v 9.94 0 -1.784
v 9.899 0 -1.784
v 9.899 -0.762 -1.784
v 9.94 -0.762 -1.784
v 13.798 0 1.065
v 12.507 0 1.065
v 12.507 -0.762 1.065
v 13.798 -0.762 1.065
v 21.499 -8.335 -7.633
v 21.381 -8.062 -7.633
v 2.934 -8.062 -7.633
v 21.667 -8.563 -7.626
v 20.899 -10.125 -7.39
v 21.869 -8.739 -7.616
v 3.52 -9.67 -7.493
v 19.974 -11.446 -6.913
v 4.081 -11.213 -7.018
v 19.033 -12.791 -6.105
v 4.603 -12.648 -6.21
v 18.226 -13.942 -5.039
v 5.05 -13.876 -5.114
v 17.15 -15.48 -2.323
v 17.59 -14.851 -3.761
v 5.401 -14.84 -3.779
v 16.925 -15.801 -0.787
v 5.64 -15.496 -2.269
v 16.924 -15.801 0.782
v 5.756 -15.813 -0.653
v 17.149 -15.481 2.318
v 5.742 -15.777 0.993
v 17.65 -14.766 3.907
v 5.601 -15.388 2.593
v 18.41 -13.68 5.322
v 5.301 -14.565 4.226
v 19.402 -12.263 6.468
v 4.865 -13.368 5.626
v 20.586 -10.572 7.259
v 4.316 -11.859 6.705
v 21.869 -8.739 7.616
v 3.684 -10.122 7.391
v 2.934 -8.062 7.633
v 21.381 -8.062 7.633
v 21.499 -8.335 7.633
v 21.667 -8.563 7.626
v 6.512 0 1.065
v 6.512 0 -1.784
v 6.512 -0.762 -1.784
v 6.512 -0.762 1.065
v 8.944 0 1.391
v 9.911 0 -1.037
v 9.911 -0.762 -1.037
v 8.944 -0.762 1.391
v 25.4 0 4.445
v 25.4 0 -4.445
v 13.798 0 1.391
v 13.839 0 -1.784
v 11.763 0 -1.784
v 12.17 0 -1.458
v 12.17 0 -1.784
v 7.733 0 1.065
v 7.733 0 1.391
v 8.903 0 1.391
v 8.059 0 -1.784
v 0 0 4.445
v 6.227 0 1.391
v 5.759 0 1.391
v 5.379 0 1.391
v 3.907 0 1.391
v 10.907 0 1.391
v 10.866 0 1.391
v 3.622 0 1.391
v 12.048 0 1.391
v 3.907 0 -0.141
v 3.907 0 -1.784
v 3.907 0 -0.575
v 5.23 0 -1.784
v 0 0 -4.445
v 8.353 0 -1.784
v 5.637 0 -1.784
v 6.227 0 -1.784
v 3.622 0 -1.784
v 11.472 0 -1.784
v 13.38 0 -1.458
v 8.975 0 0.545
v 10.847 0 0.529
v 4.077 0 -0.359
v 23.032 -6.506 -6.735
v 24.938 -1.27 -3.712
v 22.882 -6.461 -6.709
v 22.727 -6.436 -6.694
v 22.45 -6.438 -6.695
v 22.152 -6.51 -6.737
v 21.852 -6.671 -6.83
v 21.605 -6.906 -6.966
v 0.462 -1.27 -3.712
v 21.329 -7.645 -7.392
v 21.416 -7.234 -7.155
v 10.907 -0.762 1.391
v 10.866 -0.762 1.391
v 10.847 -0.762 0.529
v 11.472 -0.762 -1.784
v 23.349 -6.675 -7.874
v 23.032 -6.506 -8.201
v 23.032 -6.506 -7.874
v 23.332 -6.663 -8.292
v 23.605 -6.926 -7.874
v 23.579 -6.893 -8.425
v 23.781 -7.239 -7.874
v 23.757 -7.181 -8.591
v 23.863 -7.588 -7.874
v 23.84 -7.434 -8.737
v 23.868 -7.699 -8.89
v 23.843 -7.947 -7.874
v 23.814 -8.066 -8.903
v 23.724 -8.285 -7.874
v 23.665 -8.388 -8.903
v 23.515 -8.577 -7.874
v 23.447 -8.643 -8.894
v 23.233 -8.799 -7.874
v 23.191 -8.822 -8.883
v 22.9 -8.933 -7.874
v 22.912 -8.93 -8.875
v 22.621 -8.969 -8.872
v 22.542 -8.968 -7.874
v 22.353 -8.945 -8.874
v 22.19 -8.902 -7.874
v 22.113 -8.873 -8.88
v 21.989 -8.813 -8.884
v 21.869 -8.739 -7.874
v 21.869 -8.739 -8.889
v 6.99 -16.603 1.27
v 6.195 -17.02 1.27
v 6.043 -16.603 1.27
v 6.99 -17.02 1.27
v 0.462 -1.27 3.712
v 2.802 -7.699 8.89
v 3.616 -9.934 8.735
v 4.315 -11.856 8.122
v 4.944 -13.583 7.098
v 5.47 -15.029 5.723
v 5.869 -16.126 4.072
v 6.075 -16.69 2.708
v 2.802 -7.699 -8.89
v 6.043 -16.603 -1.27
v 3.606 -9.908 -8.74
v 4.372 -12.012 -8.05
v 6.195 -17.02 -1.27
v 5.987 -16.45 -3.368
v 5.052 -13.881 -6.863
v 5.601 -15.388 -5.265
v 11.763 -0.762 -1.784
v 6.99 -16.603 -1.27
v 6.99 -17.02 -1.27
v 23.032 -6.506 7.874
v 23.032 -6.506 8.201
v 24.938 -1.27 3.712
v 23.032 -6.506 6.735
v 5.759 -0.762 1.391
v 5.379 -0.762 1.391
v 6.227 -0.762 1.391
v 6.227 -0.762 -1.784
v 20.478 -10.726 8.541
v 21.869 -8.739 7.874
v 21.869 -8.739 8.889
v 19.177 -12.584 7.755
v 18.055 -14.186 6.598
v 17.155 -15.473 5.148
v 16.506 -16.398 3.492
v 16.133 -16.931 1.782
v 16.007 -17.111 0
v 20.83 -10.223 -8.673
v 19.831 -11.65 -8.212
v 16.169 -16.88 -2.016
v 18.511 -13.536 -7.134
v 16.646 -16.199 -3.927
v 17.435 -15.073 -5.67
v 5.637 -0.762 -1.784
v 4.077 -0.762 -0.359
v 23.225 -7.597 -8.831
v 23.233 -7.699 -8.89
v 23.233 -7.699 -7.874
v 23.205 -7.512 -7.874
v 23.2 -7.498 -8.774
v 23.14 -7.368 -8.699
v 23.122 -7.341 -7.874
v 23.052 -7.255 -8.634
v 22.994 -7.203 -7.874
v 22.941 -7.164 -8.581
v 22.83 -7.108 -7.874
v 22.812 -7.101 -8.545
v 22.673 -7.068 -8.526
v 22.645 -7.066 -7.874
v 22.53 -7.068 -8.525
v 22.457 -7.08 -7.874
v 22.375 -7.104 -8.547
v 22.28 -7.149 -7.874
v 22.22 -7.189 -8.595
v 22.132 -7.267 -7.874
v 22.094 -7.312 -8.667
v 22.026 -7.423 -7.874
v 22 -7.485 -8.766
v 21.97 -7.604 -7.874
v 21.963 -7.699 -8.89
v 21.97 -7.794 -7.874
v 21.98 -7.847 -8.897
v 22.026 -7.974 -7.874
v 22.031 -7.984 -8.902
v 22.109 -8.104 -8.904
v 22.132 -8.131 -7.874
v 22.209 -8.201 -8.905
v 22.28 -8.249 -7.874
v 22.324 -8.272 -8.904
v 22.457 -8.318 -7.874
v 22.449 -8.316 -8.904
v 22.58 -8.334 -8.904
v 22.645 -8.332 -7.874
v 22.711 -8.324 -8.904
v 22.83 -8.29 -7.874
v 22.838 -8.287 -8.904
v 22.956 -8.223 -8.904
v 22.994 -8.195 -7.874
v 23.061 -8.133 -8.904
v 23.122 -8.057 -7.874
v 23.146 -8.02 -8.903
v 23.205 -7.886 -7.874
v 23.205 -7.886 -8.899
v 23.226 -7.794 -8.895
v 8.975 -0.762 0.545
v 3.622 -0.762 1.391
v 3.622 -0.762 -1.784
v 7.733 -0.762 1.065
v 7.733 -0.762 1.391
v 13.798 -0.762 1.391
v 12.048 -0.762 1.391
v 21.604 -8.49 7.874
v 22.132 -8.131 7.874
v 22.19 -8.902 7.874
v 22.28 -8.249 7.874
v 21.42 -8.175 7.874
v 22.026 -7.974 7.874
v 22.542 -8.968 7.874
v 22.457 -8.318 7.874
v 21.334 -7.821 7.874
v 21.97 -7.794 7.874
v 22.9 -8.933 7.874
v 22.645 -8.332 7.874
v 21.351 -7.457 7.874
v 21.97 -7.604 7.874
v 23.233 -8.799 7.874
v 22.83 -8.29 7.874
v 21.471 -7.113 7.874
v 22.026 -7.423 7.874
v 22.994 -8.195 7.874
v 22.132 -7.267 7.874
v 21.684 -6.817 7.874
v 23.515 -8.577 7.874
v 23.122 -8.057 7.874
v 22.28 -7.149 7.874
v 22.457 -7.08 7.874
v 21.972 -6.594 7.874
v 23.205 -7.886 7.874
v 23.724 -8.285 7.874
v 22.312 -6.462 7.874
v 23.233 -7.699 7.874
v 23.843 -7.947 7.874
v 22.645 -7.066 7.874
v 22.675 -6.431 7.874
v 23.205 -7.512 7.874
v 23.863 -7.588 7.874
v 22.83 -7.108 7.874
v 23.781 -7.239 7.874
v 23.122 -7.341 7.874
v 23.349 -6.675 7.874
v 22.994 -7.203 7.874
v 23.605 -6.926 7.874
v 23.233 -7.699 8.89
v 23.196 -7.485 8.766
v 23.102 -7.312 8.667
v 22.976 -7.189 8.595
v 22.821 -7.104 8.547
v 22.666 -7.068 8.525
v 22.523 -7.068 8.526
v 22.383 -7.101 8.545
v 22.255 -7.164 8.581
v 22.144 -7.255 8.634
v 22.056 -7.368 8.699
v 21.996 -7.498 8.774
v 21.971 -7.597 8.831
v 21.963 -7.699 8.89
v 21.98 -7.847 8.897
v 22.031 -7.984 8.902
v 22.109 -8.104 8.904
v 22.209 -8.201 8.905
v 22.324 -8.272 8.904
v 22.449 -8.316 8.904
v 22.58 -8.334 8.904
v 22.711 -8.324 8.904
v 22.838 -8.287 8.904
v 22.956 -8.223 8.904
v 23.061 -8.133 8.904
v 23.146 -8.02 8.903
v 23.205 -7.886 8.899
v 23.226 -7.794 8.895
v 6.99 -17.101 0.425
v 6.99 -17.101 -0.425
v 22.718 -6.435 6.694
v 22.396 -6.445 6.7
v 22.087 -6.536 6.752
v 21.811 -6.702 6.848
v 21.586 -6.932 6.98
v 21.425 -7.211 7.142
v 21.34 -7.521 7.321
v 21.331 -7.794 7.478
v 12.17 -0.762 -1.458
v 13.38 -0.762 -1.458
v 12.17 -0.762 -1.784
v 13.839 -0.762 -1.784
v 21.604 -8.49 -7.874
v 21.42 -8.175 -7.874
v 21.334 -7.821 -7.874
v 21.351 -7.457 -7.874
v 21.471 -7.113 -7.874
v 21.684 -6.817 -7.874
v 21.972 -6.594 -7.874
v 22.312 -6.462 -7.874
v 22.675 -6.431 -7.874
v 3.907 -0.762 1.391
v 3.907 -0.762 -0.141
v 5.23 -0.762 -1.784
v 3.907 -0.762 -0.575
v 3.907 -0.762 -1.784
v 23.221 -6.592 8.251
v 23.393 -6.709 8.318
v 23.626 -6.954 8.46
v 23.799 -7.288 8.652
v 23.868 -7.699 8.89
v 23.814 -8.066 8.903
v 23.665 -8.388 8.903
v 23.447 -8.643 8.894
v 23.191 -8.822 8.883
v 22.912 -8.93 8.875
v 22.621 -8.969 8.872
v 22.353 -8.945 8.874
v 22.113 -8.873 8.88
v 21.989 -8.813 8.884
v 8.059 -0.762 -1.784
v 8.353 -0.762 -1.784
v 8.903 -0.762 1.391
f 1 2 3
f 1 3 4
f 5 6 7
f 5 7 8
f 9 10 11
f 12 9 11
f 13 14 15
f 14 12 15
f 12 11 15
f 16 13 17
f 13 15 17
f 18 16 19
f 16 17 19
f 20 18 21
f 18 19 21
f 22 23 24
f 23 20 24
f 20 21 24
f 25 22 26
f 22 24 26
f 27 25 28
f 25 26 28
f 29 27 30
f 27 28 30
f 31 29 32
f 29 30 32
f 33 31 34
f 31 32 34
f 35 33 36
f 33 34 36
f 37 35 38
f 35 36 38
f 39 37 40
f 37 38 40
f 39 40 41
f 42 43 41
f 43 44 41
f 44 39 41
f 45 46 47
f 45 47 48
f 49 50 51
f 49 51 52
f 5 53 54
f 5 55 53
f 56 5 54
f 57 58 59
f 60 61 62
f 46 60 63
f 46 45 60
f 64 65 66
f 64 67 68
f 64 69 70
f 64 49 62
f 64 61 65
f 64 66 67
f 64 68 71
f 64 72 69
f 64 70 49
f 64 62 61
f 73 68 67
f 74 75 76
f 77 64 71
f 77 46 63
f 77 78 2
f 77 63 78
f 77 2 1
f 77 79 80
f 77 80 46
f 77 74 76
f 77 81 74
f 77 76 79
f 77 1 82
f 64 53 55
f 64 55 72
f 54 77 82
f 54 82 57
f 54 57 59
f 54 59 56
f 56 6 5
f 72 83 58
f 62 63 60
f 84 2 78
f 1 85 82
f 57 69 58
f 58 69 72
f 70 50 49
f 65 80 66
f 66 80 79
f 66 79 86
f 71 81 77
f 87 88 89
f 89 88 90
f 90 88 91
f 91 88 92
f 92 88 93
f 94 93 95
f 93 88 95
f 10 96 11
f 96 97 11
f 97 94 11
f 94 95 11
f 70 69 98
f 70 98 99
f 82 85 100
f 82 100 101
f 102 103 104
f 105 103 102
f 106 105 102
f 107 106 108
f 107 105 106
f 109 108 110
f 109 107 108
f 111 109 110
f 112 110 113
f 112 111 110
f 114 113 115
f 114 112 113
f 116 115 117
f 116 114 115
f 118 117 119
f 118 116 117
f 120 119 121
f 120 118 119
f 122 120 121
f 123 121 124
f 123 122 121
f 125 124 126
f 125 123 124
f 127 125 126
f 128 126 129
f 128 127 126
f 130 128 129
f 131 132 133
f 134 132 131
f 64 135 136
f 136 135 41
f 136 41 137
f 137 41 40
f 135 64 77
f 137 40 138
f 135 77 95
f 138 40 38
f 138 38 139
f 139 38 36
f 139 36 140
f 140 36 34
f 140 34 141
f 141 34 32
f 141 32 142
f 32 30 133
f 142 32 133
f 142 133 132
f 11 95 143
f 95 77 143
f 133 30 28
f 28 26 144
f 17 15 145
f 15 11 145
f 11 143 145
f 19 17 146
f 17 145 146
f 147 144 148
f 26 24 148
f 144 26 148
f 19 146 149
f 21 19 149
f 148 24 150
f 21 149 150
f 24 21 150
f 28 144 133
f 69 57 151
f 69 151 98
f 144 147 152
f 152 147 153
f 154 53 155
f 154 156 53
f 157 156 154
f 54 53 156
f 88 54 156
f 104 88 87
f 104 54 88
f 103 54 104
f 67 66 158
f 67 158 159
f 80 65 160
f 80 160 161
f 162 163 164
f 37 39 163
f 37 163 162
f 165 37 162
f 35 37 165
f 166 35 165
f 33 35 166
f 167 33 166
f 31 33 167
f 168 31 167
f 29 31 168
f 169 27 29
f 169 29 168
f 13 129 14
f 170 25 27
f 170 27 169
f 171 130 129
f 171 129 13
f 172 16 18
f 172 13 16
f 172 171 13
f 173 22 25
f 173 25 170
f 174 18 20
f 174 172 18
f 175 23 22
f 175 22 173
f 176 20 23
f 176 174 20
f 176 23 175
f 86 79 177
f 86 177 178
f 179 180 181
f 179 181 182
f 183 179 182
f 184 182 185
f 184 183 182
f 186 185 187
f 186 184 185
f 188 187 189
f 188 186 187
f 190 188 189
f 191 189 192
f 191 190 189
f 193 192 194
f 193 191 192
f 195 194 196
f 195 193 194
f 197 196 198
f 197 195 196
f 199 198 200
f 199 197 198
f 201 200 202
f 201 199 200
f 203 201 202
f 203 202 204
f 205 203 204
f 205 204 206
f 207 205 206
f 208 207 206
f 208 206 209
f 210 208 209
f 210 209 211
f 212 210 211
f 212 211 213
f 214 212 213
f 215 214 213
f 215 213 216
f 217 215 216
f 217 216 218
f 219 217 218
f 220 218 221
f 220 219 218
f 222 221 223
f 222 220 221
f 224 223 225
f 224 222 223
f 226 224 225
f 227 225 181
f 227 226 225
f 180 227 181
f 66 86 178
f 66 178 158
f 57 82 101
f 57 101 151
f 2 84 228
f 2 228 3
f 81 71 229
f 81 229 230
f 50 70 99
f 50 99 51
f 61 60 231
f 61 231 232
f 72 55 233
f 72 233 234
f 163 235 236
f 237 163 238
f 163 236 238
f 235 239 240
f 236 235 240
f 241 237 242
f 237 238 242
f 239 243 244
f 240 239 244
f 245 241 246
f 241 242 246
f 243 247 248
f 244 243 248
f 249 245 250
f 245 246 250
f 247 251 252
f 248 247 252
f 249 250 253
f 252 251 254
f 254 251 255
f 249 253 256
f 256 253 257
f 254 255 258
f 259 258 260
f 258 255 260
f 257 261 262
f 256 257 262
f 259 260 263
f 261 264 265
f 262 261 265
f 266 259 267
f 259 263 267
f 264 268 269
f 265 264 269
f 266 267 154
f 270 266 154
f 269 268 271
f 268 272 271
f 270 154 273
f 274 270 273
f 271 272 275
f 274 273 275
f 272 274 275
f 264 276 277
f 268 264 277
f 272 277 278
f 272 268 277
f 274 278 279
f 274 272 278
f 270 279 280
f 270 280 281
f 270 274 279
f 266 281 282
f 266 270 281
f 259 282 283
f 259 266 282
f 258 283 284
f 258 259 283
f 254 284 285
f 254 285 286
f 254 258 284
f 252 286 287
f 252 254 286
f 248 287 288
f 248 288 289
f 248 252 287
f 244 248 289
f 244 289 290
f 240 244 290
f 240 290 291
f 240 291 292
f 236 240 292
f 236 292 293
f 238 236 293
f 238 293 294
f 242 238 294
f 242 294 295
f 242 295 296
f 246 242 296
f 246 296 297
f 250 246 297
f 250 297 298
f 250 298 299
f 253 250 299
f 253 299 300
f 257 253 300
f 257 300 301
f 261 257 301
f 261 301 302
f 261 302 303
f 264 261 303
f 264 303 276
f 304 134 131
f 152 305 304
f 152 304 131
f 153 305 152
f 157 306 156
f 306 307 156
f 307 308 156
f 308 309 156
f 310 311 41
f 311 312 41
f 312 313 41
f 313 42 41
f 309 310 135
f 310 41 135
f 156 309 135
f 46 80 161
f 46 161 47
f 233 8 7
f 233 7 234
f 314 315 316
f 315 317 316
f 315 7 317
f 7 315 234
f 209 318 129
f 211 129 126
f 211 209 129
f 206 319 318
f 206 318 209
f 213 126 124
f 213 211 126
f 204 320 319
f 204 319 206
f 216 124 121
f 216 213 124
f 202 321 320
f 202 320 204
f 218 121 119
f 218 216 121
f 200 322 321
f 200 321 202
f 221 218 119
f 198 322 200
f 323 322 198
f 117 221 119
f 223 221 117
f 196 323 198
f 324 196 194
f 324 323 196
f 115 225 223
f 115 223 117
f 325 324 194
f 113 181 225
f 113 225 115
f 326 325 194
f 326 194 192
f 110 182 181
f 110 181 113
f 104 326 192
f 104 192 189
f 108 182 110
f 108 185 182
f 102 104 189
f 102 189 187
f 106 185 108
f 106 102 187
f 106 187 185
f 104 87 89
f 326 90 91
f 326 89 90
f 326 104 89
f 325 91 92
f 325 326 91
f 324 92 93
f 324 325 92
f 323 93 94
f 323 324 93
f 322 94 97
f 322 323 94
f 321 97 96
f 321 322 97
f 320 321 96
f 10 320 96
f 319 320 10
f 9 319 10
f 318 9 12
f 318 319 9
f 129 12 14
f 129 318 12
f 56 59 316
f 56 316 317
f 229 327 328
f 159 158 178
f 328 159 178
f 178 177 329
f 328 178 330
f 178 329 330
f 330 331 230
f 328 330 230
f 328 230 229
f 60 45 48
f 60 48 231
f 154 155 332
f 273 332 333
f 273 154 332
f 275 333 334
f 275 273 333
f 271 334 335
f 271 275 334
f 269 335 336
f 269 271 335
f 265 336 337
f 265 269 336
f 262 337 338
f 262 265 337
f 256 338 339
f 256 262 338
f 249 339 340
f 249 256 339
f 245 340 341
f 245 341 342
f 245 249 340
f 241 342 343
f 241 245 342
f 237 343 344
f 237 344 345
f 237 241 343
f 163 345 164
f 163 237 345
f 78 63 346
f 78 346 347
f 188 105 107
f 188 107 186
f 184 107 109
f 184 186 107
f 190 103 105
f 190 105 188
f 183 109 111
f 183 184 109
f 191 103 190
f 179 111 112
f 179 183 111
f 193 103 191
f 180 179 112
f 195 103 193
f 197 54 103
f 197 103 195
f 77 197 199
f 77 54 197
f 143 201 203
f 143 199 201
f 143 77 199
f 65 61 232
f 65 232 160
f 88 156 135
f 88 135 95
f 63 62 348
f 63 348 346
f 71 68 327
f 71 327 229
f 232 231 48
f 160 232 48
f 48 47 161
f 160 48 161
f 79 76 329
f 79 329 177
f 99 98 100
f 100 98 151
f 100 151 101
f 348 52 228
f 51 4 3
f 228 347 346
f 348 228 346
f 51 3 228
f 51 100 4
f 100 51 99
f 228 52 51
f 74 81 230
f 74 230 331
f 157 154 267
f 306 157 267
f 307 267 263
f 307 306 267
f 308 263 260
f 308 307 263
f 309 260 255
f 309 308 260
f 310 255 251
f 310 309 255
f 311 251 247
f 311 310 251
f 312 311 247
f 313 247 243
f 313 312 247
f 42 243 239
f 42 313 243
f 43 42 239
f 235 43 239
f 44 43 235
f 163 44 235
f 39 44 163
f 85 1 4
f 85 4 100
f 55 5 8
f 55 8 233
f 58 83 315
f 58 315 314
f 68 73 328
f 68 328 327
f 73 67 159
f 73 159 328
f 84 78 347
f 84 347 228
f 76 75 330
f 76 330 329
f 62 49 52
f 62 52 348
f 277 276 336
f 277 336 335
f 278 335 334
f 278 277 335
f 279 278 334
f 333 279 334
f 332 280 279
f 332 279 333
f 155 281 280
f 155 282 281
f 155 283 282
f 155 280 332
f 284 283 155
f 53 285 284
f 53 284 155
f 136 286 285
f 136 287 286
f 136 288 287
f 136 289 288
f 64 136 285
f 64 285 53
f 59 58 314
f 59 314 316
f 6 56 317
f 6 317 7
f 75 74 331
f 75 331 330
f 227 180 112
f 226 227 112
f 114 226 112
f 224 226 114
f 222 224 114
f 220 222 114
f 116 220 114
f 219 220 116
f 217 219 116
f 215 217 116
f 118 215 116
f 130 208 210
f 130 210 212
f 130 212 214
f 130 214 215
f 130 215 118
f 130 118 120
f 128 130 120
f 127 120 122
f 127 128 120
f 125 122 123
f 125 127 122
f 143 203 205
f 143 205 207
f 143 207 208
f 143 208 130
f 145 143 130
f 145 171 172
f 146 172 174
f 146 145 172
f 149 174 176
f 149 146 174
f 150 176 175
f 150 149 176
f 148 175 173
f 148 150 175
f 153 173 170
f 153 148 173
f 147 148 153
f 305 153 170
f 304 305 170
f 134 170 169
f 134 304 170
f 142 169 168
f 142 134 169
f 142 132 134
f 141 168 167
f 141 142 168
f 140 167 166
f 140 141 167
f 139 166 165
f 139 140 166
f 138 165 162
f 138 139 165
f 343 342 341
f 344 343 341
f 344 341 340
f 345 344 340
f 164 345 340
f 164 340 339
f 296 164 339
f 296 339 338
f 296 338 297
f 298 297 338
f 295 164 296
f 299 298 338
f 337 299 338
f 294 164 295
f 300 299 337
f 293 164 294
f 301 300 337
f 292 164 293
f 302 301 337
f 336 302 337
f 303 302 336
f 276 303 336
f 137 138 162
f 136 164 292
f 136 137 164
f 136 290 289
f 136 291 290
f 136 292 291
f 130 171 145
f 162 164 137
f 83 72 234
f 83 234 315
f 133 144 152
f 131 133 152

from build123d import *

# Parameters (mm, degrees)
BOSS_EXTRUDE1_DEPTH     = 25.4
SHELL1_T                = -1.27
CUT_EXTRUDE1_DEPTH      = 32.894396236
CUT_EXTRUDE1_DEPTH_BACK = 32.894396236
SKETCH2_R               = 0.635
CUT_EXTRUDE3_DEPTH      = 7.874
CUT_EXTRUDE3_DEPTH_BACK = 7.874
SKETCH4_R               = 1.27
CUT_EXTRUDE2_DEPTH      = 0.762
CUT_EXTRUDE4_START      = -17.111468296
CUT_EXTRUDE4_OUTLINE_W  = 0.990065124
CUT_EXTRUDE4_OUTLINE_H  = 2.54
CUT_EXTRUDE4_DEPTH      = 0.508


# Read off the part's stored shape, not the designer's step: Cut-Extrude4
with BuildPart() as part:
    # Sketch1 → Boss-Extrude1 (new body)
    with BuildSketch(Plane(origin=(0, 0, 0), x_dir=(0, 0, -1), z_dir=(1, 0, 0))):
        with BuildLine():
            Line((-4.445, 0), (4.445, 0))
            Line((4.445, 0), (8.89, -7.69896584))
            ThreePointArc((8.89, -7.69896584), (0, -17.111468296), (-8.89, -7.69896584))
            Line((-8.89, -7.69896584), (-4.445, 0))
        make_face()
    extrude(amount=BOSS_EXTRUDE1_DEPTH)

    # Shell1
    shell1_openings = [part.faces().sort_by_distance(p)[0] for p in [
        (25.4, -8.481857982, 0),
        (0, -8.481857982, 0),
    ]]
    offset(amount=SHELL1_T, openings=shell1_openings, kind=Kind.INTERSECTION)

    # Sketch2 → Cut-Extrude1 (cut, two sides: drawn at the far end of the back side and taken through both)
    with BuildSketch(Plane.XY.offset(-CUT_EXTRUDE1_DEPTH_BACK)):
        with Locations((22.5978056, -7.69896584)):
            Circle(SKETCH2_R)
        with BuildLine():
            Line((25.4, 0), (23.032171182, -6.505556211))
            ThreePointArc((23.032171182, -6.505556211), (23.724309358, -8.285386578), (21.869363526, -8.739288936))
            Line((21.869363526, -8.739288936), (16.007100426, -17.111468296))
            Line((16.007100426, -17.111468296), (25.4, -17.111468296))
            Line((25.4, -17.111468296), (25.4, 0))
        make_face()
        Polygon((0, 0), (6.228065124, -17.111468296), (0, -17.111468296), align=None)
    extrude(amount=CUT_EXTRUDE1_DEPTH + CUT_EXTRUDE1_DEPTH_BACK, mode=Mode.SUBTRACT)

    # Sketch4 → Cut-Extrude3 (cut, two sides: drawn at the far end of the back side and taken through both)
    with BuildSketch(Plane.XY.offset(-CUT_EXTRUDE3_DEPTH_BACK)):
        with Locations((22.5978056, -7.69896584)):
            Circle(SKETCH4_R)
    extrude(amount=CUT_EXTRUDE3_DEPTH + CUT_EXTRUDE3_DEPTH_BACK, mode=Mode.SUBTRACT)

    # Sketch3 → Cut-Extrude2 (cut)
    with BuildSketch(Plane(origin=(0, 0, 0), x_dir=(1, 0, 0), z_dir=(0, 1, 0))):
        Polygon((3.621972553, 1.783922101), (3.906908451, 1.783922101), (3.906908451, 0.57485259), (5.230461135, 1.783922101), (5.6368764, 1.783922101), (4.076725158, 0.359242614), (5.758991784, -1.391077899), (5.37928926, -1.391077899), (3.906908451, 0.141088567), (3.906908451, -1.391077899), (3.621972553, -1.391077899), align=None)
        Polygon((6.227100758, 1.783922101), (6.512036656, 1.783922101), (6.512036656, -1.065436874), (7.733190502, -1.065436874), (7.733190502, -1.391077899), (6.227100758, -1.391077899), align=None)
        Polygon((8.058831528, 1.783922101), (8.35330769, 1.783922101), (8.974696912, -0.544538436), (9.898830526, 1.783922101), (9.940171672, 1.783922101), (10.84713281, -0.528637995), (11.471702121, 1.783922101), (11.762998194, 1.783922101), (10.906918467, -1.391077899), (10.866213339, -1.391077899), (9.910914861, 1.037237405), (8.944168066, -1.391077899), (8.903462938, -1.391077899), align=None)
        Polygon((12.170049476, 1.458281075), (12.170049476, 1.783922101), (13.838959733, 1.783922101), (12.507138819, -1.065436874), (13.798254605, -1.065436874), (13.798254605, -1.391077899), (12.047934092, -1.391077899), (13.379755005, 1.458281075), align=None)
    extrude(amount=-CUT_EXTRUDE2_DEPTH, mode=Mode.SUBTRACT)

    # Cut-Extrude4 outline → Cut-Extrude4 (cut)
    with BuildSketch(Plane(origin=(0, 0, 0), x_dir=(1, 0, 0), z_dir=(0, 1, 0)).offset(CUT_EXTRUDE4_START)):
        with Locations((6.495032562, 0)):
            Rectangle(CUT_EXTRUDE4_OUTLINE_W, CUT_EXTRUDE4_OUTLINE_H)
    extrude(amount=CUT_EXTRUDE4_DEPTH, mode=Mode.SUBTRACT)


solid = part.part
